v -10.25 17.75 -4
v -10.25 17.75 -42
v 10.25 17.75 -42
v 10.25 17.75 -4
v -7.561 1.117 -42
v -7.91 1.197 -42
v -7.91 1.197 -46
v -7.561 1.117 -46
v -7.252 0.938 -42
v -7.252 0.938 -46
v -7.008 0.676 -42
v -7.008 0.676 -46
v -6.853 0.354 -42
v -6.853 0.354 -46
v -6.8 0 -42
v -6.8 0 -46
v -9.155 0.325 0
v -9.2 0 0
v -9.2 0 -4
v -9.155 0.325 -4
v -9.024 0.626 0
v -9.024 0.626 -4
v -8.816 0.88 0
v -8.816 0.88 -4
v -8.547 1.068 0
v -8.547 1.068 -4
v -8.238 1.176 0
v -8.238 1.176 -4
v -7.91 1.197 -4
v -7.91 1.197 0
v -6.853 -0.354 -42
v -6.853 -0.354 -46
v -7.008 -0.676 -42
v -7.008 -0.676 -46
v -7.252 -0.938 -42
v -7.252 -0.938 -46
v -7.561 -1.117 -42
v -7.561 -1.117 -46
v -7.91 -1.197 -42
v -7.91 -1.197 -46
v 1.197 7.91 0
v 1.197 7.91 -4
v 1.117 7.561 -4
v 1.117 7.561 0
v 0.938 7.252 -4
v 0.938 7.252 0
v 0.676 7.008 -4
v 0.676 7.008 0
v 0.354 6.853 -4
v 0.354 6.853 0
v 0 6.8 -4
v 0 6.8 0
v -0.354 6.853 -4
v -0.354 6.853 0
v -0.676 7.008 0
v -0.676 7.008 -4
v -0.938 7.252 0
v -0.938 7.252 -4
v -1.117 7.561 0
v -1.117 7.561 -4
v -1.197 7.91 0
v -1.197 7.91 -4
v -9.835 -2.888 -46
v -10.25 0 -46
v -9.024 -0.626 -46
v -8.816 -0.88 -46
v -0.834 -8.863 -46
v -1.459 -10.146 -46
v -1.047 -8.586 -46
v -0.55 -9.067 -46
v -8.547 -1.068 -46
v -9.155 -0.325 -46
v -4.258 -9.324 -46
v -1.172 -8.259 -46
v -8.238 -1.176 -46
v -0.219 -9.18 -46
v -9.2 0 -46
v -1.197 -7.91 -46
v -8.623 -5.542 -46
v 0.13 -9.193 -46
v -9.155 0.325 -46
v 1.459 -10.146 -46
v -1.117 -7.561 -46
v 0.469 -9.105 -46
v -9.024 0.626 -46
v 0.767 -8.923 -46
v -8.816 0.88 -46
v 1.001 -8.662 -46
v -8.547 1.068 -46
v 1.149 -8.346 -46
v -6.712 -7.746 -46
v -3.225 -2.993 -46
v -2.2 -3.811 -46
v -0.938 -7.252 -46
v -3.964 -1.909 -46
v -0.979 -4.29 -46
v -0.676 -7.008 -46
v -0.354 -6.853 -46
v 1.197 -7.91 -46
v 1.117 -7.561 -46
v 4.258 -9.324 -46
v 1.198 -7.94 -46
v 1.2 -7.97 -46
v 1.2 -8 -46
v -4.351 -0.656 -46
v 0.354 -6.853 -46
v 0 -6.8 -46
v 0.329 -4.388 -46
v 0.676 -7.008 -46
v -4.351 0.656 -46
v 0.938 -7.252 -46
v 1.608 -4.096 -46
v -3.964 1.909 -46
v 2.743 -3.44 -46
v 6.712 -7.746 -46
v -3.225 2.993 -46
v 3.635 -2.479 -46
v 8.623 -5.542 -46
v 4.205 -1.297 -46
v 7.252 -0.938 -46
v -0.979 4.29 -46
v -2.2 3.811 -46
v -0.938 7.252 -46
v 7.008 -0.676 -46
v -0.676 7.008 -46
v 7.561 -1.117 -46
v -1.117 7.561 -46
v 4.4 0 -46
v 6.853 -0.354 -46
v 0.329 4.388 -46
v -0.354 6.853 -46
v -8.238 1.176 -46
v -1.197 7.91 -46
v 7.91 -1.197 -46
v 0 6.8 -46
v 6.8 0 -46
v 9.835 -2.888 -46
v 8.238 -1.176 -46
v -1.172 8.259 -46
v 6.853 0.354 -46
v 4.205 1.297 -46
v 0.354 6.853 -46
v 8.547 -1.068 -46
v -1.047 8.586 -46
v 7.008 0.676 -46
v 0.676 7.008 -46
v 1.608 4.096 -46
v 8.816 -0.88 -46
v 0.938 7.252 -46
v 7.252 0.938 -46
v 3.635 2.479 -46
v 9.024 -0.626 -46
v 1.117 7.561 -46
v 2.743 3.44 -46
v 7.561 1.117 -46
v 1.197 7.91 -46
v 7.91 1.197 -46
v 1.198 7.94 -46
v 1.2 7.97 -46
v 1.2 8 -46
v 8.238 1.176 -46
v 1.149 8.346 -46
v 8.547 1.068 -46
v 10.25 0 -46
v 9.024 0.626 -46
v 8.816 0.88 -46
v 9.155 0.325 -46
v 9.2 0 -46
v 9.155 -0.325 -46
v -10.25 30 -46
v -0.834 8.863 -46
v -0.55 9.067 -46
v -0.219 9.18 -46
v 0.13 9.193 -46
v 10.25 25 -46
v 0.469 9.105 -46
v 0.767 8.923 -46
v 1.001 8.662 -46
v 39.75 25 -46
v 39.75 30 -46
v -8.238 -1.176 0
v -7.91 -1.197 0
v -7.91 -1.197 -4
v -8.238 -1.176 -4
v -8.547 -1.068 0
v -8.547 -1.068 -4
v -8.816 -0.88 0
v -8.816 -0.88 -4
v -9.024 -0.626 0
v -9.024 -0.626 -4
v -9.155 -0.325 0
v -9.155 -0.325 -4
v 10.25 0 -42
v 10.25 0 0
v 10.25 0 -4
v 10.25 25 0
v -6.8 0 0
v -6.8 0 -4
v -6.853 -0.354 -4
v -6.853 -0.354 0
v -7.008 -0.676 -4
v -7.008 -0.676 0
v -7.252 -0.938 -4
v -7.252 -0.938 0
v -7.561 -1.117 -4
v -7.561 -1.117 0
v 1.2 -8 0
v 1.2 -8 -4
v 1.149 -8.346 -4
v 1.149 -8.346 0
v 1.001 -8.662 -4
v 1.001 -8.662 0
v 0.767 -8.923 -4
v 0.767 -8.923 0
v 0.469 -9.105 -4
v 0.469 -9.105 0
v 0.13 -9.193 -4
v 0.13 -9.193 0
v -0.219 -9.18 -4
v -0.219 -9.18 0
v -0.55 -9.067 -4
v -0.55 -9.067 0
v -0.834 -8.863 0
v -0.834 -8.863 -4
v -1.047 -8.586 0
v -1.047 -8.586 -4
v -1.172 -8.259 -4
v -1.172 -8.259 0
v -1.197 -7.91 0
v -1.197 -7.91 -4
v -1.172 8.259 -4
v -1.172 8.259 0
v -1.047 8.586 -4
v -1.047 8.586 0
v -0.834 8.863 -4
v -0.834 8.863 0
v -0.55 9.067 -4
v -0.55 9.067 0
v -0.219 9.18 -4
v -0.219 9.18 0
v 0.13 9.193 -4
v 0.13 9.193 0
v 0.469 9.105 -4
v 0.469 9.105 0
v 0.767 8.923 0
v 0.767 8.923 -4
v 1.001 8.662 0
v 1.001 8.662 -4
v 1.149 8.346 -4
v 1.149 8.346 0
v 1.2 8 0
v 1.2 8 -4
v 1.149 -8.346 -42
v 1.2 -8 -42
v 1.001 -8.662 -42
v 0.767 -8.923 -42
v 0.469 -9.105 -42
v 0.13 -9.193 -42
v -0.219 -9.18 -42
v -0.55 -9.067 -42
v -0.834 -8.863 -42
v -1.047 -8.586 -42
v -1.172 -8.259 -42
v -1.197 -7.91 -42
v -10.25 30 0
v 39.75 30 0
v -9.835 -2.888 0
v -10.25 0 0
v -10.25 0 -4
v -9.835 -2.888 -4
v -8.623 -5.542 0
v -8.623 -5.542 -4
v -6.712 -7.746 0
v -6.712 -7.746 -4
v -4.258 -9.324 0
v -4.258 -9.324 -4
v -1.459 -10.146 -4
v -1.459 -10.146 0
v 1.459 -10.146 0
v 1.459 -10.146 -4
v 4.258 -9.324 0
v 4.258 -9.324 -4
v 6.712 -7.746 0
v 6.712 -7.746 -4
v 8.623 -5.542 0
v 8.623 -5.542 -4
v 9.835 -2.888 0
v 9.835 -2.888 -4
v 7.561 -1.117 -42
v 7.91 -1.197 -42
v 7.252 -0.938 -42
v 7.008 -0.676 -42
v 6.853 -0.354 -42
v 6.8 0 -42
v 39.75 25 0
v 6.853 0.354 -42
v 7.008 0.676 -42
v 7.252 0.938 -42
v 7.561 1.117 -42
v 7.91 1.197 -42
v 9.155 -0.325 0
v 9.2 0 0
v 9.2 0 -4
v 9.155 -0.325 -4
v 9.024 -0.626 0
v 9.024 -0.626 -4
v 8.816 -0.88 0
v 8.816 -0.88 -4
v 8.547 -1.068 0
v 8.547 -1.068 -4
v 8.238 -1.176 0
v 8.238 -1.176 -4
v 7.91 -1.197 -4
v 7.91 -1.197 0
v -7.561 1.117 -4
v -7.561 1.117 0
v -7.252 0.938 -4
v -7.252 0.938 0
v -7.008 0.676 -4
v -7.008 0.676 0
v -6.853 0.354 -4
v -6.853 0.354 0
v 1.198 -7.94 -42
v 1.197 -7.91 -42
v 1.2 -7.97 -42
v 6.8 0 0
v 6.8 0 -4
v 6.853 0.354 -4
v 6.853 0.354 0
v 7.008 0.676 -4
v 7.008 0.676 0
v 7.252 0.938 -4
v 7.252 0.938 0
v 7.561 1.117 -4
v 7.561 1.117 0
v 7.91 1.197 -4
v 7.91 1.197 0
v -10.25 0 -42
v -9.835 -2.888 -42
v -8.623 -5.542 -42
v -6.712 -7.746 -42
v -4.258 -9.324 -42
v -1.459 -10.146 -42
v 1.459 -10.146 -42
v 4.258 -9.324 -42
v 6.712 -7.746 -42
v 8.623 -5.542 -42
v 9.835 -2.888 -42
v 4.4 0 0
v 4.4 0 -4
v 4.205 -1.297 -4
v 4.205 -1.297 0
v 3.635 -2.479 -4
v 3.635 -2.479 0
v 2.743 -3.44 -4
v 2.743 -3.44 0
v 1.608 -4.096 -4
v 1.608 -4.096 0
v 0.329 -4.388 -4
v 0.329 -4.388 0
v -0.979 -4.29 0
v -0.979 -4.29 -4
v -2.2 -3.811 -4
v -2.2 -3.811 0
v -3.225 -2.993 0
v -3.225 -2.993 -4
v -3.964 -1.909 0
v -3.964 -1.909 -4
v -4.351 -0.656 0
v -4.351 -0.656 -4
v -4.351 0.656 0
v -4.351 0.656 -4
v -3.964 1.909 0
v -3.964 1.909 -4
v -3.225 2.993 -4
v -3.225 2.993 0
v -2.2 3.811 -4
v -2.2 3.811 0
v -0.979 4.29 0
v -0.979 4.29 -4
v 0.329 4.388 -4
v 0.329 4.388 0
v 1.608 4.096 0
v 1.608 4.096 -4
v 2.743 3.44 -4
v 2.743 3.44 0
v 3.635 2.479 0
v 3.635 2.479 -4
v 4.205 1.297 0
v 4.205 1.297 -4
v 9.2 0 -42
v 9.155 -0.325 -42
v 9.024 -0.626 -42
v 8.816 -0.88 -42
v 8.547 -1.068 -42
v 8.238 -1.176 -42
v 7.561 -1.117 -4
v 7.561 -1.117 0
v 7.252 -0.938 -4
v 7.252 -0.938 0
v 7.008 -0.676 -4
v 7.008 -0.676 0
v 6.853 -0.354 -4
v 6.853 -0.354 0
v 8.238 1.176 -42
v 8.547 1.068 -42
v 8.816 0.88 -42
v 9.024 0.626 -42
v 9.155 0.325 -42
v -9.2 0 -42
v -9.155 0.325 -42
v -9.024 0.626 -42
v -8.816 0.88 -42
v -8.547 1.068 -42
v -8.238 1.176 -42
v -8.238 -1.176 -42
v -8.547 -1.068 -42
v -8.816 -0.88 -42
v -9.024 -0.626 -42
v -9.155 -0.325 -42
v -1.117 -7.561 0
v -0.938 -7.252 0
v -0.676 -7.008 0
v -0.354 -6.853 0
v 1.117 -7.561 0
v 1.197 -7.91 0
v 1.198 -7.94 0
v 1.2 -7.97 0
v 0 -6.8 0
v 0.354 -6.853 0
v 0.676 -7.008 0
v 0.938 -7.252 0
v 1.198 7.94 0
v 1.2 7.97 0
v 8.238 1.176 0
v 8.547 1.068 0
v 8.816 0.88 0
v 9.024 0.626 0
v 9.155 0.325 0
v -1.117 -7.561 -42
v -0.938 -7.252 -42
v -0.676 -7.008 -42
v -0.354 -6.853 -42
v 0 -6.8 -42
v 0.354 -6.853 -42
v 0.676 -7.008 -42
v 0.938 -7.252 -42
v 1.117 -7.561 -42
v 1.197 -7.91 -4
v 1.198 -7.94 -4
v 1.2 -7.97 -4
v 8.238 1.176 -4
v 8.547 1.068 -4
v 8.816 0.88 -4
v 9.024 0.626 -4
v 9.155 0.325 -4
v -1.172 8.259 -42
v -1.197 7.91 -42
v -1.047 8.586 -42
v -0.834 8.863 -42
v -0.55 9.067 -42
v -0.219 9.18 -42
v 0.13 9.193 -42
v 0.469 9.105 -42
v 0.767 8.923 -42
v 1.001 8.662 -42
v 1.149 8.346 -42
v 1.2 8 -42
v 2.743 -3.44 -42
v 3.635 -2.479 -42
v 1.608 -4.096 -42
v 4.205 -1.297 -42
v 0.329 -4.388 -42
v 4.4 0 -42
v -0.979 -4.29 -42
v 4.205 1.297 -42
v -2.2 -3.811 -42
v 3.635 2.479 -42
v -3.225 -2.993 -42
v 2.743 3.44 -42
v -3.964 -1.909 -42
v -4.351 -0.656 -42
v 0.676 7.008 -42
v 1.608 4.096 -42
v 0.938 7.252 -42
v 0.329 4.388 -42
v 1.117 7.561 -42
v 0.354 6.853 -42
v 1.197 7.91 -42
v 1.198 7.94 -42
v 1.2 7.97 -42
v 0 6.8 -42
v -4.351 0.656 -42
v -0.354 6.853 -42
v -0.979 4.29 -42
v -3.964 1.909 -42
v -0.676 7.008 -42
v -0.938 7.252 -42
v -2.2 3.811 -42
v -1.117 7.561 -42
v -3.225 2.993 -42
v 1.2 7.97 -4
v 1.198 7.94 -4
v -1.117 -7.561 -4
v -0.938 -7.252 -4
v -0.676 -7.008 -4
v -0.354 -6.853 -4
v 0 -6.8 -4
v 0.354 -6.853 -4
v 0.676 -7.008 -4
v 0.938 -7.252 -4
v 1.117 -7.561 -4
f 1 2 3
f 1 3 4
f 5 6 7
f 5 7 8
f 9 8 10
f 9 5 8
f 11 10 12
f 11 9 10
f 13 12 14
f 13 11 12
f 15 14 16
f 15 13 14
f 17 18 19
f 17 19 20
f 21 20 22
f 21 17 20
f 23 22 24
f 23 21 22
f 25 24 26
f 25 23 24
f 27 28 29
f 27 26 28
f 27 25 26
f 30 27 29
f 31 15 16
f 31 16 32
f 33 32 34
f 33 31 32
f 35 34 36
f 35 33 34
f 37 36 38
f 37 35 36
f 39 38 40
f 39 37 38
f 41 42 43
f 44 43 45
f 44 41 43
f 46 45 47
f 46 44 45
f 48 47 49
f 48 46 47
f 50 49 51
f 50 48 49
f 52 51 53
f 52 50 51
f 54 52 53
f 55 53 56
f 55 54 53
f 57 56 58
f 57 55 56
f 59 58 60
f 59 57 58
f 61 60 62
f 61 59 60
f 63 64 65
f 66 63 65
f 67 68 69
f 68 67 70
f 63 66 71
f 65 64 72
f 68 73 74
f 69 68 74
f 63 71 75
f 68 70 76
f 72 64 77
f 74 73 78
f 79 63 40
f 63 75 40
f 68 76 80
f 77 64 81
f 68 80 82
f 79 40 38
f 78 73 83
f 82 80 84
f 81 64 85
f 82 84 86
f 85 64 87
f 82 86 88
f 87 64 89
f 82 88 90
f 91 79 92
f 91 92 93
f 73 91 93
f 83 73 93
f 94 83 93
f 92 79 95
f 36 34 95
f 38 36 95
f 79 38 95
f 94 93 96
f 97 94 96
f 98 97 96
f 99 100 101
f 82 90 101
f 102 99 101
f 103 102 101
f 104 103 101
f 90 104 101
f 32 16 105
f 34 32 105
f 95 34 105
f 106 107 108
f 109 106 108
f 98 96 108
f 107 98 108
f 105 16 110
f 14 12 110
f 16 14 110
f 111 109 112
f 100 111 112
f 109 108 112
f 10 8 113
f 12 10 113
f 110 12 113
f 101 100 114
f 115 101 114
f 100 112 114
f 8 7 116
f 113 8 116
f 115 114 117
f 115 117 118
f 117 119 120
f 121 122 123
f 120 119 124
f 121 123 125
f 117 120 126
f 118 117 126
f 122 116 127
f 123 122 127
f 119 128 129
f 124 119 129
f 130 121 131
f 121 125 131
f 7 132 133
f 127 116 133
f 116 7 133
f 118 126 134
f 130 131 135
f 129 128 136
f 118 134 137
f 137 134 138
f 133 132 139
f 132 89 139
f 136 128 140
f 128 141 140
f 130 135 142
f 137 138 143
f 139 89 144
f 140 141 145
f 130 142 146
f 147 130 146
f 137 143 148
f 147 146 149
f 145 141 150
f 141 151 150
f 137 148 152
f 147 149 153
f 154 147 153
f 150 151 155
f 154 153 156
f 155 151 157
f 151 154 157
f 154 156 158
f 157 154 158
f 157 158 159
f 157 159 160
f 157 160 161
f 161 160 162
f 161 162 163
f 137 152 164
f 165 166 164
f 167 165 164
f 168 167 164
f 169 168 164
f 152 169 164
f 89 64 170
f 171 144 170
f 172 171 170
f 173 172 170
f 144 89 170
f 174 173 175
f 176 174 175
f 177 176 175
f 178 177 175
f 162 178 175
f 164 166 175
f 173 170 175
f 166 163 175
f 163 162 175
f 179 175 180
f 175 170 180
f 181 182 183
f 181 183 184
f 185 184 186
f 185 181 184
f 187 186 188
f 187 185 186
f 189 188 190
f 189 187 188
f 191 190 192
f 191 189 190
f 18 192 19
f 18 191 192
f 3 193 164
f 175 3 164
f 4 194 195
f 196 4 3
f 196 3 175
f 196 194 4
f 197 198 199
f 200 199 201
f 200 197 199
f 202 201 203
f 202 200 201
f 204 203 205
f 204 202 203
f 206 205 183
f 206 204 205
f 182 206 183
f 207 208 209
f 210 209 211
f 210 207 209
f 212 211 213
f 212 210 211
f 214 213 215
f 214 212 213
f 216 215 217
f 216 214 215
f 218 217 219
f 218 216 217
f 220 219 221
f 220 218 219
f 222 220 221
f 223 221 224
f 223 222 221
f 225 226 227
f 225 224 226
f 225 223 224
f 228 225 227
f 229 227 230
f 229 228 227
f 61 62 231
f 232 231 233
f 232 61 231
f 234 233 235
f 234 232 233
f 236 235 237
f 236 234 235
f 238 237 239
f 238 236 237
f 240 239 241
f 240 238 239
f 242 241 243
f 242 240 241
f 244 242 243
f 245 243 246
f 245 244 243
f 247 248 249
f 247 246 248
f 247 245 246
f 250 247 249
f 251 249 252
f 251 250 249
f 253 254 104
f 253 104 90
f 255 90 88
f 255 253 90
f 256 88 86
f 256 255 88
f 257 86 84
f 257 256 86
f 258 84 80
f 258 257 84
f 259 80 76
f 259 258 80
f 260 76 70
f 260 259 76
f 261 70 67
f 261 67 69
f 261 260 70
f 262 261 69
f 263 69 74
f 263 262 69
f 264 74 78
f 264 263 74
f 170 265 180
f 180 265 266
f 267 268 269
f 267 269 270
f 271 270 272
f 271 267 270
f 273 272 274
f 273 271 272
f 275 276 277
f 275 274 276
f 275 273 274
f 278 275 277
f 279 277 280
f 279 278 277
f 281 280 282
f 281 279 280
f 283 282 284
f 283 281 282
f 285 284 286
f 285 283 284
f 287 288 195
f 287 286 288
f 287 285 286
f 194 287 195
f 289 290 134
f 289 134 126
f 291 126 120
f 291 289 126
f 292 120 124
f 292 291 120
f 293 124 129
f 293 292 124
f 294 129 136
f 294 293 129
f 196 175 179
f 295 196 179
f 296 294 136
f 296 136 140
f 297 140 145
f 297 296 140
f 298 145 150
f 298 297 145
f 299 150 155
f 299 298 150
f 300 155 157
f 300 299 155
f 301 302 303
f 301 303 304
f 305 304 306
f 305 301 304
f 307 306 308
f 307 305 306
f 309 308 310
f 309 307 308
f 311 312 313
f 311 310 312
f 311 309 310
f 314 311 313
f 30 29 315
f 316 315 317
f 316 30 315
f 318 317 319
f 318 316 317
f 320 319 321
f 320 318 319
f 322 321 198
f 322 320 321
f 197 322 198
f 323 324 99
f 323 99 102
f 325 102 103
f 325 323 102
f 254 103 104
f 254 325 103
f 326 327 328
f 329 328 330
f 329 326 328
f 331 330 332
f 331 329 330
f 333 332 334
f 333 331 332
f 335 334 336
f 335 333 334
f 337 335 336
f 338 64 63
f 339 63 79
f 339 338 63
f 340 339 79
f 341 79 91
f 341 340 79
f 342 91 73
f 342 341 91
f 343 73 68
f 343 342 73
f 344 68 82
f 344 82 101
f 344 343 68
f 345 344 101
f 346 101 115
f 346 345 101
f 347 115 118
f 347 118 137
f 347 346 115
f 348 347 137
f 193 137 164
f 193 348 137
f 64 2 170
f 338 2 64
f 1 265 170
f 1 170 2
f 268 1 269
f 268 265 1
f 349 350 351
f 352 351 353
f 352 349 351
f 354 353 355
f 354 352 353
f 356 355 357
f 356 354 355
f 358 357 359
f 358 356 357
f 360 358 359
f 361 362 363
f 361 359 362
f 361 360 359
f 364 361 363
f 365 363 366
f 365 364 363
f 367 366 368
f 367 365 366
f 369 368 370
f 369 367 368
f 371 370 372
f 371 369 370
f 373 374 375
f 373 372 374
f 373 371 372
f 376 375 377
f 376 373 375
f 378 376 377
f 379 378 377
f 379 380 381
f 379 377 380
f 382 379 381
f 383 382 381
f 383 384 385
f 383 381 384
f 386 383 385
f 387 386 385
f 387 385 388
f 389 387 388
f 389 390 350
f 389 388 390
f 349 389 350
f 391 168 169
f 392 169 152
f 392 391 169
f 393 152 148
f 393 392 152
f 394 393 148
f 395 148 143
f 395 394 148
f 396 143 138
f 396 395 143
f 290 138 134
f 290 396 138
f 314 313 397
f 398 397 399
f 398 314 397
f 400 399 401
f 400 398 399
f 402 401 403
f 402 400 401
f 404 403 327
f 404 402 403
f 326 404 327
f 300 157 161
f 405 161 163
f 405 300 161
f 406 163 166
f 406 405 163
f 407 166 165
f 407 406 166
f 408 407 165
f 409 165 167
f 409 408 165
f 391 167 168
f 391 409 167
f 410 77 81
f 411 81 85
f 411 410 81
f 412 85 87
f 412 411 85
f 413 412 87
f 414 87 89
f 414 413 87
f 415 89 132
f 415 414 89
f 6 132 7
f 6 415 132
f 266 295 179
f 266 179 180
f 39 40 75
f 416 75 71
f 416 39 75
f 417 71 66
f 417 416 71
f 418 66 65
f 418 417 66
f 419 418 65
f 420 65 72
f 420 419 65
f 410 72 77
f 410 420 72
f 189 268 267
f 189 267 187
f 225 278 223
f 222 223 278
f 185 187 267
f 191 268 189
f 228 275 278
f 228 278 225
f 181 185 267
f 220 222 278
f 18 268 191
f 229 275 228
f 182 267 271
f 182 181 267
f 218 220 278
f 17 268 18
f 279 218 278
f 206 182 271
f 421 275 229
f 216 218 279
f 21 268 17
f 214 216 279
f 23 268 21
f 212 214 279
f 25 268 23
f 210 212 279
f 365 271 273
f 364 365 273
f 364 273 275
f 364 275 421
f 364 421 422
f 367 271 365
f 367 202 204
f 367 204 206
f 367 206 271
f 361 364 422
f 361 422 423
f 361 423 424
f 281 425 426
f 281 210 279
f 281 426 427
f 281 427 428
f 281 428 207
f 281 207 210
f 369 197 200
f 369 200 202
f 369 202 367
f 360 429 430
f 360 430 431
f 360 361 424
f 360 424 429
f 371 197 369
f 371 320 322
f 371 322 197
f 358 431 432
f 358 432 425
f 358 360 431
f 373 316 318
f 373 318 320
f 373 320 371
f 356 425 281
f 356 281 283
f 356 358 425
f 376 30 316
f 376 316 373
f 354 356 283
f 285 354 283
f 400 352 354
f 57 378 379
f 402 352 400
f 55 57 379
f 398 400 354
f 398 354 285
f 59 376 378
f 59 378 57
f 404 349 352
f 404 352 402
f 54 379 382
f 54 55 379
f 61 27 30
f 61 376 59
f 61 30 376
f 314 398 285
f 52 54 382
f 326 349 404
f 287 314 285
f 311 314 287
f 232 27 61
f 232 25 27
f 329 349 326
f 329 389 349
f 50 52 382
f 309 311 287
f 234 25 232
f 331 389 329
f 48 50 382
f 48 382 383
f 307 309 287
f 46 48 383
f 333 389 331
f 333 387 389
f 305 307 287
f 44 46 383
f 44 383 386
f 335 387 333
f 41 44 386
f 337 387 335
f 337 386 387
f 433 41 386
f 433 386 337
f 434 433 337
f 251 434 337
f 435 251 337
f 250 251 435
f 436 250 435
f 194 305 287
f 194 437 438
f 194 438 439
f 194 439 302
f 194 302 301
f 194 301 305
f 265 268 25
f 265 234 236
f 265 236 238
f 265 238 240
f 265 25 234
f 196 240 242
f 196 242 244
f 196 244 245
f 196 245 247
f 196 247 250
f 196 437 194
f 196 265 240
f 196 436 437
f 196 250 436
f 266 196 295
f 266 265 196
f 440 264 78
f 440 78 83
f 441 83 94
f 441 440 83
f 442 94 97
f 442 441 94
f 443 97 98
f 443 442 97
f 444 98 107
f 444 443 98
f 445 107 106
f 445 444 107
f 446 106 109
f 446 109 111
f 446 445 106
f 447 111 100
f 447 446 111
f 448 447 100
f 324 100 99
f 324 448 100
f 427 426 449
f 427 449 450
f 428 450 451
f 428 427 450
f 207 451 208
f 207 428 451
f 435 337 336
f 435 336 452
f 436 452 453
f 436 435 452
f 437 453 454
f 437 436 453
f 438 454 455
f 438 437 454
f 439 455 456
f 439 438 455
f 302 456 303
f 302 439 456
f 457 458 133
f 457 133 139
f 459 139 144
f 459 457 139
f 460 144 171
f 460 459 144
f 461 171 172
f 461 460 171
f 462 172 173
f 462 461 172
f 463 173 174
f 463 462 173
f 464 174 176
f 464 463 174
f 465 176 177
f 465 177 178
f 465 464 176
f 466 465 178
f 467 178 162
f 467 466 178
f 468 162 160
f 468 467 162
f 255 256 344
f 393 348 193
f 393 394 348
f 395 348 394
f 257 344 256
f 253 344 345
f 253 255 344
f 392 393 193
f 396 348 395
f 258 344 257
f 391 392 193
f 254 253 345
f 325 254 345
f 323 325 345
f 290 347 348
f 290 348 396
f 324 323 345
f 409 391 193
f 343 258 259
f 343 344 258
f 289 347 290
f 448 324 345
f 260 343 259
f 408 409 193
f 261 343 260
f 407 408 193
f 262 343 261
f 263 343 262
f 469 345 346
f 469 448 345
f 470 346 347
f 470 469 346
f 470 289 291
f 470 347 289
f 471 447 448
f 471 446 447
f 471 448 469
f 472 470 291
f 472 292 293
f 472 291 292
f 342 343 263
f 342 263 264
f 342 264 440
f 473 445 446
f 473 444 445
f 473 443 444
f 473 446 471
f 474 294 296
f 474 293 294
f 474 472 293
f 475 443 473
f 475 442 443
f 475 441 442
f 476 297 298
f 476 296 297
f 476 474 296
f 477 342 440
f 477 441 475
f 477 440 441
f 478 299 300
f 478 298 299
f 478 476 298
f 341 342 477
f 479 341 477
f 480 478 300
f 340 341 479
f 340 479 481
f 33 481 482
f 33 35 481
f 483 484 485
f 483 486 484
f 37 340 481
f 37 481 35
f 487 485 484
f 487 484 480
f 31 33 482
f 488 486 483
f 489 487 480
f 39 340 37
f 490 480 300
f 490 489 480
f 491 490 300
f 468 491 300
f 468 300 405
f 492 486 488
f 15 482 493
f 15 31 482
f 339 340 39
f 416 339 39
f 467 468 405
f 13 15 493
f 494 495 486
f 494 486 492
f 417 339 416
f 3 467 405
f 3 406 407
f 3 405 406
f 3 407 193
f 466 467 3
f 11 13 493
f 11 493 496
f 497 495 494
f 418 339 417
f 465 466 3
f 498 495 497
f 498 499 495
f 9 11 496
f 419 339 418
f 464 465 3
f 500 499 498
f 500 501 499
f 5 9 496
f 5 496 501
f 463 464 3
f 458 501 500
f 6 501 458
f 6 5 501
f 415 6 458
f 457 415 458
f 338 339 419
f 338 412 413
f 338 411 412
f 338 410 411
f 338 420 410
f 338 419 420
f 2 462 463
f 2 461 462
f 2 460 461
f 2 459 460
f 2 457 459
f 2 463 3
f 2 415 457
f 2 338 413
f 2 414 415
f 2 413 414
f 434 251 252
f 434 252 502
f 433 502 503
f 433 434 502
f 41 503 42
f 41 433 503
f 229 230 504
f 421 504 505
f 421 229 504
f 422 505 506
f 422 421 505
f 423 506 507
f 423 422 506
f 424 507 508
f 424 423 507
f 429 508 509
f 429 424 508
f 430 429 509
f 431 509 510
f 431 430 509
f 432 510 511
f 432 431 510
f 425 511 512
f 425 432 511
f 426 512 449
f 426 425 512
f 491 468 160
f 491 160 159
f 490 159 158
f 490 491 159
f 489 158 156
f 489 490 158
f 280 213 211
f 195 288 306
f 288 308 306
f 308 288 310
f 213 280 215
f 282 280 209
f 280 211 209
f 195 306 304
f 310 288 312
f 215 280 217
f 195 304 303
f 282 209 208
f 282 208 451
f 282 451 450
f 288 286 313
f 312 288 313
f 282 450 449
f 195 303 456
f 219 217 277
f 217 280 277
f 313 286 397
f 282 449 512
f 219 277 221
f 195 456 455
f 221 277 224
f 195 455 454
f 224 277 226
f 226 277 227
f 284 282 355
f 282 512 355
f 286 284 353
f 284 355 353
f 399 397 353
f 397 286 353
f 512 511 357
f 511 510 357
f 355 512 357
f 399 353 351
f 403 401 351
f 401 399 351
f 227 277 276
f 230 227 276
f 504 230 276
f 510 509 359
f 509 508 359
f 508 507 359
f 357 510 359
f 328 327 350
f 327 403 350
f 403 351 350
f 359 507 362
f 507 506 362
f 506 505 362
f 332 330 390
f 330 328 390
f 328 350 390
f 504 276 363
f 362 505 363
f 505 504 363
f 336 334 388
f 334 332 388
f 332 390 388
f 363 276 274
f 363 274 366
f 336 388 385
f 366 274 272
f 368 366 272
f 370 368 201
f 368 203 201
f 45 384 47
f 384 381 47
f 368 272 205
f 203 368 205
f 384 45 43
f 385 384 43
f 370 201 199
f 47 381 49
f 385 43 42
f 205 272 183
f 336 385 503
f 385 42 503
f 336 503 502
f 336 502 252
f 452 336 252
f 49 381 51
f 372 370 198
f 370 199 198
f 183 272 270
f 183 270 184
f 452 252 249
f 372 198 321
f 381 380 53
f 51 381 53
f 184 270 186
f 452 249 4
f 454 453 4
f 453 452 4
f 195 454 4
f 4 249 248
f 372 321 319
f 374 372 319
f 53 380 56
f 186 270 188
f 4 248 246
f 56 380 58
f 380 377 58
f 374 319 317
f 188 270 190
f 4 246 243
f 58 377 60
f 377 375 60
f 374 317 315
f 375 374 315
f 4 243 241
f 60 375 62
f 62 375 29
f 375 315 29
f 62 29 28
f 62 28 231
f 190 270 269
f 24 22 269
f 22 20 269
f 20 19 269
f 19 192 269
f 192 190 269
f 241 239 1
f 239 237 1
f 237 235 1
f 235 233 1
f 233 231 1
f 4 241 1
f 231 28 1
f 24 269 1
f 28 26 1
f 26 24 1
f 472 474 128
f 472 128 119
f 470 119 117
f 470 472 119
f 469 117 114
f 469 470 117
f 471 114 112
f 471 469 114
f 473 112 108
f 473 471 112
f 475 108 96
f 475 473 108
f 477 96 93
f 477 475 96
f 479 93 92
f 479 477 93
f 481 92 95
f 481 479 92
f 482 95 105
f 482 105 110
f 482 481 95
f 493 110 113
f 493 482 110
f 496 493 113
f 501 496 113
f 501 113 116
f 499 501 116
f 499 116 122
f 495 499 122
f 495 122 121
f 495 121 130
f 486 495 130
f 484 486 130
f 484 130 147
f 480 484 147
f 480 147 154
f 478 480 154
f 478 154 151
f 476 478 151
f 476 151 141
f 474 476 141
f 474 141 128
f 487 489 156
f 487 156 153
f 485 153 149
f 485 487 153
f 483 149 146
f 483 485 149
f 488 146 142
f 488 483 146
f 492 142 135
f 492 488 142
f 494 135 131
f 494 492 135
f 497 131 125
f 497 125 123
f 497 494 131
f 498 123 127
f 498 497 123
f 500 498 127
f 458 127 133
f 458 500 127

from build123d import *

# Parameters (mm, degrees)
SKETCH1_W           = 50
SKETCH1_H           = 5
BOSS_EXTRUDE1_DEPTH = 46
SKETCH2_W           = 38
SKETCH2_H           = 28
CUT_EXTRUDE1_DEPTH  = 46


with BuildPart() as part:
    # Sketch1 → Boss-Extrude1 (new body)
    with BuildSketch(Plane.XY):
        with BuildLine():
            ThreePointArc((-10.25, 0), (0, 10.25), (10.25, 0))
            Line((10.25, 0), (10.25, 25))
            Line((10.25, 25), (-10.25, 25))
            Line((-10.25, 25), (-10.25, 0))
        make_face()
        with BuildLine():
            Line((9.2, 0), (10.25, 0))
            ThreePointArc((10.25, 0), (0, 10.25), (-10.25, 0))
            Line((-10.25, 0), (-9.2, 0))
            ThreePointArc((-9.2, 0), (-8.816088231, 0.879772698), (-7.91, 1.196620241))
            ThreePointArc((-7.91, 1.196620241), (-5.656854249, 5.656854249), (-1.196620241, 7.91))
            ThreePointArc((-1.196620241, 7.91), (-0.045031719, 9.199154762), (1.2, 8))
            ThreePointArc((1.2, 8), (1.199154762, 7.954968281), (1.196620241, 7.91))
            ThreePointArc((1.196620241, 7.91), (5.656854249, 5.656854249), (7.91, 1.196620241))
            ThreePointArc((7.91, 1.196620241), (8.816088231, 0.879772698), (9.2, 0))
        make_face()
        with BuildLine():
            ThreePointArc((6.8, 0), (7.120227302, 0.816088231), (7.91, 1.196620241))
            ThreePointArc((7.91, 1.196620241), (5.656854249, 5.656854249), (1.196620241, 7.91))
            ThreePointArc((1.196620241, 7.91), (0, 6.8), (-1.196620241, 7.91))
            ThreePointArc((-1.196620241, 7.91), (-5.656854249, 5.656854249), (-7.91, 1.196620241))
            ThreePointArc((-7.91, 1.196620241), (-7.120227302, 0.816088231), (-6.8, 0))
            Line((-6.8, 0), (-4.4, 0))
            ThreePointArc((-4.4, 0), (0, 4.4), (4.4, 0))
            Line((4.4, 0), (6.8, 0))
        make_face()
        with BuildLine():
            ThreePointArc((-10.25, 0), (0, -10.25), (10.25, 0))
            Line((10.25, 0), (9.2, 0))
            ThreePointArc((9.2, 0), (8.816088231, -0.879772698), (7.91, -1.196620241))
            ThreePointArc((7.91, -1.196620241), (5.656854249, -5.656854249), (1.196620241, -7.91))
            ThreePointArc((1.196620241, -7.91), (1.199154762, -7.954968281), (1.2, -8))
            ThreePointArc((1.2, -8), (-0.045031719, -9.199154762), (-1.196620241, -7.91))
            ThreePointArc((-1.196620241, -7.91), (-5.656854249, -5.656854249), (-7.91, -1.196620241))
            ThreePointArc((-7.91, -1.196620241), (-8.816088231, -0.879772698), (-9.2, 0))
            Line((-9.2, 0), (-10.25, 0))
        make_face()
        with BuildLine():
            ThreePointArc((1.196620241, -7.91), (5.656854249, -5.656854249), (7.91, -1.196620241))
            ThreePointArc((7.91, -1.196620241), (7.120227302, -0.816088231), (6.8, 0))
            Line((6.8, 0), (4.4, 0))
            ThreePointArc((4.4, 0), (0, -4.4), (-4.4, 0))
            Line((-4.4, 0), (-6.8, 0))
            ThreePointArc((-6.8, 0), (-7.120227302, -0.816088231), (-7.91, -1.196620241))
            ThreePointArc((-7.91, -1.196620241), (-5.656854249, -5.656854249), (-1.196620241, -7.91))
            ThreePointArc((-1.196620241, -7.91), (0, -6.8), (1.196620241, -7.91))
        make_face()
        with Locations((14.75, 27.5)):
            Rectangle(SKETCH1_W, SKETCH1_H)
    extrude(amount=-BOSS_EXTRUDE1_DEPTH)

    # Sketch2 → Cut-Extrude1 (cut)
    with BuildSketch(Plane.ZY.offset(10.25)):
        with Locations((-23, 3.75)):
            Rectangle(SKETCH2_W, SKETCH2_H)
    extrude(amount=-CUT_EXTRUDE1_DEPTH, mode=Mode.SUBTRACT)


solid = part.part
